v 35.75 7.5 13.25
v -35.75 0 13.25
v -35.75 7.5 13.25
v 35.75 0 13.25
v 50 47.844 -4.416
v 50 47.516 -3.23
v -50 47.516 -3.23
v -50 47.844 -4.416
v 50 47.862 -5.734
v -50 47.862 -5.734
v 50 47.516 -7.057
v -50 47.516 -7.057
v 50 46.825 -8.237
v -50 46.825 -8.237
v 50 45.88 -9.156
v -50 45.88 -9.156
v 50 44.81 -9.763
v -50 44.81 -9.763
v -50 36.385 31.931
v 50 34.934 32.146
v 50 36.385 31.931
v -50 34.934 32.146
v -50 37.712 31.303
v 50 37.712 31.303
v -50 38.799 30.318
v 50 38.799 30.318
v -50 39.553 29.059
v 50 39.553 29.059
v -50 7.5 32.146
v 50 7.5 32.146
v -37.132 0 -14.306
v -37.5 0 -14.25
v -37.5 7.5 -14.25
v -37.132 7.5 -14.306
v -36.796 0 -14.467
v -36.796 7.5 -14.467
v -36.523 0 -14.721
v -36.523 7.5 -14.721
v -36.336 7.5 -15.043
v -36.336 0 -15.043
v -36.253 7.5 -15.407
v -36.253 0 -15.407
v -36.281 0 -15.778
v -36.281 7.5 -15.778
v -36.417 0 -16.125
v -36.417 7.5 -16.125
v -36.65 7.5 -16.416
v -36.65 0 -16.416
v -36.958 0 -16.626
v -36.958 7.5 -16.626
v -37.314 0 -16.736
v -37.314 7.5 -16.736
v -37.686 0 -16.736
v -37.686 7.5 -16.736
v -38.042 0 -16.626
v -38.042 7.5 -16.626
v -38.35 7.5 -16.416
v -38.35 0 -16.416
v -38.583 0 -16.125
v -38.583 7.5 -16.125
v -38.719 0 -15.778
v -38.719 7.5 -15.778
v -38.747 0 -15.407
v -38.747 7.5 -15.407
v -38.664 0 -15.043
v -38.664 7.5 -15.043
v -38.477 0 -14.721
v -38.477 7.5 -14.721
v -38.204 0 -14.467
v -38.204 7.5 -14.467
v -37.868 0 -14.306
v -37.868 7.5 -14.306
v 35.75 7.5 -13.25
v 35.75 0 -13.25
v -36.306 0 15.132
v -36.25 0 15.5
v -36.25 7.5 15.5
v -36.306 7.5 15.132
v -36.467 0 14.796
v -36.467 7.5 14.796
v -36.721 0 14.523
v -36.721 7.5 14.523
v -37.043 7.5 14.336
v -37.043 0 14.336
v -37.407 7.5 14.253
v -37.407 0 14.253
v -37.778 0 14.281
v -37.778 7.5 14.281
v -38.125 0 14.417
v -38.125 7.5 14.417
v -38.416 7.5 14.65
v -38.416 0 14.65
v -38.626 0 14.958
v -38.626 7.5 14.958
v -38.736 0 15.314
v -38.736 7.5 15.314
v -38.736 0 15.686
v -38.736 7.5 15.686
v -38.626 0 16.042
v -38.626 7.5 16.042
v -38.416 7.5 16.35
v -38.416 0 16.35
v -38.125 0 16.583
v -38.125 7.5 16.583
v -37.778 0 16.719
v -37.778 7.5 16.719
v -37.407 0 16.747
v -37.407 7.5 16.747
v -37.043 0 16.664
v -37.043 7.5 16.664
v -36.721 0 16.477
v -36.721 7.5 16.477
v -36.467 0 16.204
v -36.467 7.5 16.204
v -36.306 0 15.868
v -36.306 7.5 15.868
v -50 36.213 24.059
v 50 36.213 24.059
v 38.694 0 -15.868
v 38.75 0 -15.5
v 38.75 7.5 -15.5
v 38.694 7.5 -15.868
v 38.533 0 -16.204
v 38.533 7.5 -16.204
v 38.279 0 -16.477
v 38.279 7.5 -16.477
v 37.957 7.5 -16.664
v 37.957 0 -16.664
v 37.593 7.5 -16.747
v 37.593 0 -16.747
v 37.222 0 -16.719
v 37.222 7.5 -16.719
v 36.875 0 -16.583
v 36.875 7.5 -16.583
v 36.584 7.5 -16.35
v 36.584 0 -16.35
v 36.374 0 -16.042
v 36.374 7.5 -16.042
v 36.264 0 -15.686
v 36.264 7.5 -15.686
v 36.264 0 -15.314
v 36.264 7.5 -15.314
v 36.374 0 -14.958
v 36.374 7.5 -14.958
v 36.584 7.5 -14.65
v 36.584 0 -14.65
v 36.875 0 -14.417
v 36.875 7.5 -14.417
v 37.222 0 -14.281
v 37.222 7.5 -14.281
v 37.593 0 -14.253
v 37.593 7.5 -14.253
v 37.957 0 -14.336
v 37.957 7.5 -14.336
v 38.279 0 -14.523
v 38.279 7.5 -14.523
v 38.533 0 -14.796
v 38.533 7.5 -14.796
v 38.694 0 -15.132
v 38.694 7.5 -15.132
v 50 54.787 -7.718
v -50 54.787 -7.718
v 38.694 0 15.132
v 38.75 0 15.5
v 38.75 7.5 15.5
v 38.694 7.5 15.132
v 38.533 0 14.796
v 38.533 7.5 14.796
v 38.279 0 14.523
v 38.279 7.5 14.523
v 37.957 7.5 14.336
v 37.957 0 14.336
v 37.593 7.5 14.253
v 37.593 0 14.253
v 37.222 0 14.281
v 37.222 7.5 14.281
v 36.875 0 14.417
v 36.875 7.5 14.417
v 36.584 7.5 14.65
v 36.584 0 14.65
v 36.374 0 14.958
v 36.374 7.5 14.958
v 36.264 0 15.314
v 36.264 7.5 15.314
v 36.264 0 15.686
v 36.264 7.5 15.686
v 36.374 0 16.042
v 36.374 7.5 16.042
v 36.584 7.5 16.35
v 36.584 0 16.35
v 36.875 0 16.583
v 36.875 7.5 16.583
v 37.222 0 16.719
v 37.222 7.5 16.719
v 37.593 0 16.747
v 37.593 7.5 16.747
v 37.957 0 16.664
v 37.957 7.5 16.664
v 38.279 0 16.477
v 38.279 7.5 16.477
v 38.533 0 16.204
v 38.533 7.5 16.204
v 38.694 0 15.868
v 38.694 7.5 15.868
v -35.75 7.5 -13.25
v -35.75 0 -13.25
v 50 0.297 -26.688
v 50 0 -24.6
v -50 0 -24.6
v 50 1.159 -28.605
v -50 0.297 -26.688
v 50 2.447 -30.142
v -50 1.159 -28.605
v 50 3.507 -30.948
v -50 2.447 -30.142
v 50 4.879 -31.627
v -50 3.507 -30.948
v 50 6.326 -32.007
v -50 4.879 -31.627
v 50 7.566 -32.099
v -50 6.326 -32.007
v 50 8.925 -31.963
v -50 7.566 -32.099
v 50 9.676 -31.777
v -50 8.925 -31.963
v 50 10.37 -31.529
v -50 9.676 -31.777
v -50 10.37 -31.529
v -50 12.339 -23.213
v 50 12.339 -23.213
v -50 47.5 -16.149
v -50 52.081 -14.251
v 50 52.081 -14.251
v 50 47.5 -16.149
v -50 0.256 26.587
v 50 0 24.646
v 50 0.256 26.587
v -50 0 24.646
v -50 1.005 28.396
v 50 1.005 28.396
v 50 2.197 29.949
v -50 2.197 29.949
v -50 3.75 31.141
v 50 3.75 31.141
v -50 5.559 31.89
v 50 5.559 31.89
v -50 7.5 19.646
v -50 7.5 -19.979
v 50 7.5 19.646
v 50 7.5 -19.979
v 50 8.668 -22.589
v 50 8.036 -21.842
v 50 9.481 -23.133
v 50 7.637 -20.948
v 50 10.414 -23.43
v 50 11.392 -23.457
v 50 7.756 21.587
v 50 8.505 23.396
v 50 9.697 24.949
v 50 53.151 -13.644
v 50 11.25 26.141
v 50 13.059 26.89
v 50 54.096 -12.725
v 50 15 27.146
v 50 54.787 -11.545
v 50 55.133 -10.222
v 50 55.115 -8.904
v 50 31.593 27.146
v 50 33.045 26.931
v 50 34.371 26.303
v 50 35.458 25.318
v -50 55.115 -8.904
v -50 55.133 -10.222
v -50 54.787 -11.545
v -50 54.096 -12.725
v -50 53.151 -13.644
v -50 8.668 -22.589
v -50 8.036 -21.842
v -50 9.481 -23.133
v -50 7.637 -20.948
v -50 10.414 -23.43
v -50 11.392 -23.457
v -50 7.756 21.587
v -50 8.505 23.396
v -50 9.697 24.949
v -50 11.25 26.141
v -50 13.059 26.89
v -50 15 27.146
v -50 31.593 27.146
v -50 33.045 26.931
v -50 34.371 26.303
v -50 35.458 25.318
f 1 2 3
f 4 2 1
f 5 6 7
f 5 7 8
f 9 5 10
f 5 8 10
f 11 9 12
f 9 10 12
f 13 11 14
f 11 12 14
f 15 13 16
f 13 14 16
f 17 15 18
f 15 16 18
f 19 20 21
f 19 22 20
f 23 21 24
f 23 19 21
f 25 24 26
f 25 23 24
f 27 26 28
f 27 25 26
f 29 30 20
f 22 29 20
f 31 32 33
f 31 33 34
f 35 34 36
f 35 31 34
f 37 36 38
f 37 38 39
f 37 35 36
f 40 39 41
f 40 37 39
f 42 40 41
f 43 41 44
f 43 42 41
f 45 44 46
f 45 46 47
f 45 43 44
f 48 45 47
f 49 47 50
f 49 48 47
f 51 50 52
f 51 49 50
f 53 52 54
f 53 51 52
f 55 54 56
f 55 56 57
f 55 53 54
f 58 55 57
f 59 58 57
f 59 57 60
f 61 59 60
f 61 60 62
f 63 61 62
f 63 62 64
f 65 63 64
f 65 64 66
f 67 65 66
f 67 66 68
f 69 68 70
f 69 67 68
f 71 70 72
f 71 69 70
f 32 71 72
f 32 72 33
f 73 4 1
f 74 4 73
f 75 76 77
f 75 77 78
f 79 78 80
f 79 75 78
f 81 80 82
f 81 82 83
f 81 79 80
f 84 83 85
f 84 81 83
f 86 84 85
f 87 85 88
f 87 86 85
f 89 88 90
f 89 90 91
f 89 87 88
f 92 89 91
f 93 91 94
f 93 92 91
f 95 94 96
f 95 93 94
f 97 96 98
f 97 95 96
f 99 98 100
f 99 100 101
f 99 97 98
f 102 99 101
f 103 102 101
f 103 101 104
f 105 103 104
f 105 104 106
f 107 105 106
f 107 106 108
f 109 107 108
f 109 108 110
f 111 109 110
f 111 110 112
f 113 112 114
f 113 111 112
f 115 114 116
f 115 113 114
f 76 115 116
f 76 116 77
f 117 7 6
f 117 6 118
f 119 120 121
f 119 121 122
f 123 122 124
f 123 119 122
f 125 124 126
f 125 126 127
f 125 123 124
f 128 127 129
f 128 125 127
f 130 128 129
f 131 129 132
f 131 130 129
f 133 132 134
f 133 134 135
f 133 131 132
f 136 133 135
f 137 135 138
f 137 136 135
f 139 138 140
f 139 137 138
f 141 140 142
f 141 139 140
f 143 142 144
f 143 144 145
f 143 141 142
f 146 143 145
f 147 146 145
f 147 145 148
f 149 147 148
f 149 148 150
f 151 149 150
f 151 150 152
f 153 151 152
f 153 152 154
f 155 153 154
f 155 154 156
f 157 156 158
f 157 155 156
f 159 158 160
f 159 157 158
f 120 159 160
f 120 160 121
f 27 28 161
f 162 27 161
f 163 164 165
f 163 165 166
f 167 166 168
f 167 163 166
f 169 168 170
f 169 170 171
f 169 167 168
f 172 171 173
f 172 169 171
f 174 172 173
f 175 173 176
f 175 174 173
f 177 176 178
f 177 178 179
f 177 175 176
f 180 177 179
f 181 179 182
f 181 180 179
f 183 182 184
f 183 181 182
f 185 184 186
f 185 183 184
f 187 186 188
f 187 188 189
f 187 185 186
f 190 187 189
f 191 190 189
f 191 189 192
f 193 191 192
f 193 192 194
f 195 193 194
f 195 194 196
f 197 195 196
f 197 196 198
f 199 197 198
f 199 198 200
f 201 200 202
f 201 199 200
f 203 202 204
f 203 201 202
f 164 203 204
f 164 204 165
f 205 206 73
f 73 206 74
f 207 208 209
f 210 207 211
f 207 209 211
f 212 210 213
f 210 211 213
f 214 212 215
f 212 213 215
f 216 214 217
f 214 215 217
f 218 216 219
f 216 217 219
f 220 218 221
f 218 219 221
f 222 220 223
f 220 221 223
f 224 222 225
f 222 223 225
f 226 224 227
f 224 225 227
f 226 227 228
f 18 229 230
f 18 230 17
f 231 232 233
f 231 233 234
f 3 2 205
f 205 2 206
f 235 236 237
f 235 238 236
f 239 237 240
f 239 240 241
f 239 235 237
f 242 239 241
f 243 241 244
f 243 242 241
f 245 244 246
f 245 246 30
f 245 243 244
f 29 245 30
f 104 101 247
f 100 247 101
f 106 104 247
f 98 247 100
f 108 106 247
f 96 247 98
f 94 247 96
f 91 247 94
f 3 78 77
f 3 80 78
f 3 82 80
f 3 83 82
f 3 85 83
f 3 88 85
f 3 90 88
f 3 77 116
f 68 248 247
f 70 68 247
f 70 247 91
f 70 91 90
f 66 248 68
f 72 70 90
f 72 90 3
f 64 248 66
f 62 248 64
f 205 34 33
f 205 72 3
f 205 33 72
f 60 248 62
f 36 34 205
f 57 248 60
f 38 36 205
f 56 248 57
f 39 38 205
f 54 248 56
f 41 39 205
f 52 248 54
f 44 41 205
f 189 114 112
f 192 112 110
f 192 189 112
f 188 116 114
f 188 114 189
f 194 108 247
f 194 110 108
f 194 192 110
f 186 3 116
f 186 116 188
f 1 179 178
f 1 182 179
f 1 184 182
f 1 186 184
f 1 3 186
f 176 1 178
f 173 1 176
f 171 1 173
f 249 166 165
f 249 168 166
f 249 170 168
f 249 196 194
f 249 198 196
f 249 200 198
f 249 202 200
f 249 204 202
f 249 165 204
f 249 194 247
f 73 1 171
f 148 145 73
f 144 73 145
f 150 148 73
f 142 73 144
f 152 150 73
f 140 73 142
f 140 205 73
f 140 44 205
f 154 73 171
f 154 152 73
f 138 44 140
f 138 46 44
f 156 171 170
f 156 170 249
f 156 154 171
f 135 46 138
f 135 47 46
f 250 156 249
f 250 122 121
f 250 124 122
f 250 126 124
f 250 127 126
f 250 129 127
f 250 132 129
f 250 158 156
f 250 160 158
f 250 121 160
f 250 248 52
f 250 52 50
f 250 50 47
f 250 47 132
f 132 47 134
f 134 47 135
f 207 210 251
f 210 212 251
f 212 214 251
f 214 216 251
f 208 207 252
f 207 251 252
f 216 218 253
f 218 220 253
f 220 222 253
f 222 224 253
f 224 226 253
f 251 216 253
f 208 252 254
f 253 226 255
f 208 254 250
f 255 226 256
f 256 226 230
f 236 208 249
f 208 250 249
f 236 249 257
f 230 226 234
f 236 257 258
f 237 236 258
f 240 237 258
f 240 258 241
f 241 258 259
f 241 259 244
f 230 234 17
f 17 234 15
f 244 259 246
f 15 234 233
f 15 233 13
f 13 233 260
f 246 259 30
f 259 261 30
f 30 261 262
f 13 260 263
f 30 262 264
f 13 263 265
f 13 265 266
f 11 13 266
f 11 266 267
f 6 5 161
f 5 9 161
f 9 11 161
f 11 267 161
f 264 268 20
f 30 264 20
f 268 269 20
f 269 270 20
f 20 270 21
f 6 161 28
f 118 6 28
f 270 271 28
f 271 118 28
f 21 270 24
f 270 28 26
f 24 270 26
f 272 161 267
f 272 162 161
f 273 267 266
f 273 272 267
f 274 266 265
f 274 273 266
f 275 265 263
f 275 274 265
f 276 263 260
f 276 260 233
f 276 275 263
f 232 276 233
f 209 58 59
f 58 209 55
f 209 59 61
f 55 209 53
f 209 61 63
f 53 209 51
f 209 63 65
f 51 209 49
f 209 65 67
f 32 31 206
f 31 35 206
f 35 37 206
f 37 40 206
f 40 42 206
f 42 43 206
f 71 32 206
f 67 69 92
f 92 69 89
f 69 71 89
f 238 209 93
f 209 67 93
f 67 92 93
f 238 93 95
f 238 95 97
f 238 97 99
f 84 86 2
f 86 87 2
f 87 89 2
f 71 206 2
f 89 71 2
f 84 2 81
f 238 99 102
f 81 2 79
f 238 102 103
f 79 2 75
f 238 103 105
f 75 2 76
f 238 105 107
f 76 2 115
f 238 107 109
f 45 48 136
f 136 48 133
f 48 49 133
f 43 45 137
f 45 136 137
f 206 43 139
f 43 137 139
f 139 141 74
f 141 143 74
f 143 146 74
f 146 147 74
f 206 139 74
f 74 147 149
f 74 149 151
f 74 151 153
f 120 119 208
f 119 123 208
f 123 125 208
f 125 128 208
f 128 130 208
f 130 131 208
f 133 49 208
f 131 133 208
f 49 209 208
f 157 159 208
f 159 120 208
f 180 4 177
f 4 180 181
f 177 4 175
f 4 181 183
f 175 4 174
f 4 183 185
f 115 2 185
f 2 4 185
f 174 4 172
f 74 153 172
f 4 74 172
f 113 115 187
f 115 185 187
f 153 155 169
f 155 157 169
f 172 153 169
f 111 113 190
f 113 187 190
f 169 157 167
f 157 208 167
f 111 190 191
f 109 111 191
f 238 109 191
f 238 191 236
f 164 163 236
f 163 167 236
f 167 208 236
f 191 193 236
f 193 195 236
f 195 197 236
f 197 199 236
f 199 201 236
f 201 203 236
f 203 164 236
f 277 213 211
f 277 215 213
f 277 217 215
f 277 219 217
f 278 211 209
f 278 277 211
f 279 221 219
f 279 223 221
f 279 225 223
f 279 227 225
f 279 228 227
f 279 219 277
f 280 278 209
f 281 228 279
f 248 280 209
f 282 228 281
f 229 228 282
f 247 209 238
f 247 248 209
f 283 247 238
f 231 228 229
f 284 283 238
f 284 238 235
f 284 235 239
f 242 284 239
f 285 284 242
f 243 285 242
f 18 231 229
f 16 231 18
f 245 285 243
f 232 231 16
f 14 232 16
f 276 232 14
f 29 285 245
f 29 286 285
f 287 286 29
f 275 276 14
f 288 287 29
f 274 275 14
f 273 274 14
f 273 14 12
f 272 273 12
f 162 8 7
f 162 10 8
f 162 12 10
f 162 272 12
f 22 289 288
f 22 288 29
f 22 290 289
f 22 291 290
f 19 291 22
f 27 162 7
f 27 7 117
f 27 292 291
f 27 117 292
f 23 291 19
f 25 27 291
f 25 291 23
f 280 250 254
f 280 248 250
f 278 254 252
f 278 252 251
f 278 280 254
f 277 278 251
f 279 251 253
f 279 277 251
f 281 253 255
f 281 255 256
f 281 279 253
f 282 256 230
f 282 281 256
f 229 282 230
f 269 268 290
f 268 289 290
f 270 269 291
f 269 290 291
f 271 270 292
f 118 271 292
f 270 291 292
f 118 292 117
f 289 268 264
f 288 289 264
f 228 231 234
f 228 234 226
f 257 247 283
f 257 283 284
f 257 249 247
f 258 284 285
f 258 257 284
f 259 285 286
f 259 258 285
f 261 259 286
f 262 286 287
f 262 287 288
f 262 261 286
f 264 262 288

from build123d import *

# Parameters (mm, degrees)
SKETCH1_W               = 100
SKETCH1_H               = 65.435021842
SKETCH1_R               = 1.2499975
SKETCH1_W_2             = 71.5
SKETCH1_H_2             = 26.5
BOSS_EXTRUDE1_DEPTH     = 7.5
MIRROR2_OUTLINE_R       = 1.2499975
MIRROR2_DEPTH           = 7.5
MIRROR3_OUTLINE_R       = 1.2499975
MIRROR3_DEPTH           = 7.5
BOSS_EXTRUDE2_DEPTH     = 100
FILLET2_R               = 7.5
CUT_EXTRUDE2_DEPTH      = 116.441064867
CUT_EXTRUDE2_DEPTH_BACK = 116.441064867
SKETCH5_W               = 7.5
SKETCH5_H               = 10.864122905
BOSS_EXTRUDE3_DEPTH     = 100
FILLET4_R               = 3.5
FILLET5_R               = 7.5
FILLET6_R               = 5


# Read off the part's stored shape, not the designer's step: Mirror2, Mirror3
with BuildPart() as part:
    # Sketch1 → Boss-Extrude1 (new body)
    with BuildSketch(Plane(origin=(0, 0, 0), x_dir=(1, 0, 0), z_dir=(0, 1, 0))):
        Rectangle(SKETCH1_W, SKETCH1_H)
        with Locations(Location((-37.5, 15.499999988, 0), (0, 0, 270))):
            Circle(SKETCH1_R, mode=Mode.SUBTRACT)
        Rectangle(SKETCH1_W_2, SKETCH1_H_2, mode=Mode.SUBTRACT)
    extrude(amount=BOSS_EXTRUDE1_DEPTH)

    # Mirror2 outline → Mirror2 (cut)
    with BuildSketch(Plane(origin=(0, 0, 0), x_dir=(1, 0, 0), z_dir=(0, 1, 0))):
        with Locations((37.5, 15.499999988)):
            Circle(MIRROR2_OUTLINE_R)
    extrude(amount=MIRROR2_DEPTH, mode=Mode.SUBTRACT)

    # Mirror3 outline → Mirror3 (cut)
    with BuildSketch(Plane(origin=(0, 0, 0), x_dir=(1, 0, 0), z_dir=(0, 1, 0))):
        with Locations((-37.5, -15.499999988)):
            Circle(MIRROR3_OUTLINE_R)
        with Locations((37.5, -15.499999988)):
            Circle(MIRROR3_OUTLINE_R)
    extrude(amount=MIRROR3_DEPTH, mode=Mode.SUBTRACT)

    # Sketch4 → Boss-Extrude2 (add)
    with BuildSketch(Plane(origin=(50, 0, 0), x_dir=(0, 0, -1), z_dir=(1, 0, 0))):
        Polygon((28.324112639, 0), (8.64916927, 47.499515121), (16.14916927, 47.499515121), (32.717510921, 7.5), (35.824112639, 0), align=None)
    extrude(amount=-BOSS_EXTRUDE2_DEPTH)

    # Fillet2
    fillet2_edges = [part.edges().sort_by_distance(p)[0] for p in [
        (0, 0, -35.824112639),
    ]]
    fillet(fillet2_edges, radius=FILLET2_R)

    # Sketch5 → Cut-Extrude2 (cut, two sides: drawn at the far end of the back side and taken through both)
    with BuildSketch(Plane(origin=(50, 0, 0), x_dir=(0, 0, -1), z_dir=(1, 0, 0)).offset(-CUT_EXTRUDE2_DEPTH_BACK)):
        with Locations((-30.896013204, 2.067938548)):
            Rectangle(SKETCH5_W, SKETCH5_H)
    extrude(amount=CUT_EXTRUDE2_DEPTH + CUT_EXTRUDE2_DEPTH_BACK, mode=Mode.SUBTRACT)

    # Sketch6 → Boss-Extrude3 (add)
    with BuildSketch(Plane(origin=(50, 0, 0), x_dir=(0, 0, -1), z_dir=(1, 0, 0))):
        Polygon((-27.146013204, 0), (-32.146013204, 0), (-32.146013204, 38.274911515), (12.337893428, 56.700748949), (13.485305965, 53.930650039), (16.14916927, 47.499515121), (12.93914216, 38.274911515), (8.66493866, 47.461444446), (7.84966016, 49.429700857), (-27.146013204, 34.934018325), align=None)
    extrude(amount=-BOSS_EXTRUDE3_DEPTH)

    # Fillet4
    fillet4_edges = [part.edges().sort_by_distance(p)[0] for p in [
        (0, 7.5, -25.217510921),
    ]]
    fillet(fillet4_edges, radius=FILLET4_R)

    # Fillet5
    fillet5_edges = [part.edges().sort_by_distance(p)[0] for p in [
        (0, 7.5, 27.146013204),
        (0, 0, 32.146013204),
    ]]
    fillet(fillet5_edges, radius=FILLET5_R)

    # Fillet6
    fillet6_edges = [part.edges().sort_by_distance(p)[0] for p in [
        (0, 34.934018325, 27.146013204),
        (0, 38.274911515, 32.146013204),
        (0, 56.700748949, -12.337893428),
        (0, 49.429700857, -7.84966016),
    ]]
    fillet(fillet6_edges, radius=FILLET6_R)


solid = part.part
